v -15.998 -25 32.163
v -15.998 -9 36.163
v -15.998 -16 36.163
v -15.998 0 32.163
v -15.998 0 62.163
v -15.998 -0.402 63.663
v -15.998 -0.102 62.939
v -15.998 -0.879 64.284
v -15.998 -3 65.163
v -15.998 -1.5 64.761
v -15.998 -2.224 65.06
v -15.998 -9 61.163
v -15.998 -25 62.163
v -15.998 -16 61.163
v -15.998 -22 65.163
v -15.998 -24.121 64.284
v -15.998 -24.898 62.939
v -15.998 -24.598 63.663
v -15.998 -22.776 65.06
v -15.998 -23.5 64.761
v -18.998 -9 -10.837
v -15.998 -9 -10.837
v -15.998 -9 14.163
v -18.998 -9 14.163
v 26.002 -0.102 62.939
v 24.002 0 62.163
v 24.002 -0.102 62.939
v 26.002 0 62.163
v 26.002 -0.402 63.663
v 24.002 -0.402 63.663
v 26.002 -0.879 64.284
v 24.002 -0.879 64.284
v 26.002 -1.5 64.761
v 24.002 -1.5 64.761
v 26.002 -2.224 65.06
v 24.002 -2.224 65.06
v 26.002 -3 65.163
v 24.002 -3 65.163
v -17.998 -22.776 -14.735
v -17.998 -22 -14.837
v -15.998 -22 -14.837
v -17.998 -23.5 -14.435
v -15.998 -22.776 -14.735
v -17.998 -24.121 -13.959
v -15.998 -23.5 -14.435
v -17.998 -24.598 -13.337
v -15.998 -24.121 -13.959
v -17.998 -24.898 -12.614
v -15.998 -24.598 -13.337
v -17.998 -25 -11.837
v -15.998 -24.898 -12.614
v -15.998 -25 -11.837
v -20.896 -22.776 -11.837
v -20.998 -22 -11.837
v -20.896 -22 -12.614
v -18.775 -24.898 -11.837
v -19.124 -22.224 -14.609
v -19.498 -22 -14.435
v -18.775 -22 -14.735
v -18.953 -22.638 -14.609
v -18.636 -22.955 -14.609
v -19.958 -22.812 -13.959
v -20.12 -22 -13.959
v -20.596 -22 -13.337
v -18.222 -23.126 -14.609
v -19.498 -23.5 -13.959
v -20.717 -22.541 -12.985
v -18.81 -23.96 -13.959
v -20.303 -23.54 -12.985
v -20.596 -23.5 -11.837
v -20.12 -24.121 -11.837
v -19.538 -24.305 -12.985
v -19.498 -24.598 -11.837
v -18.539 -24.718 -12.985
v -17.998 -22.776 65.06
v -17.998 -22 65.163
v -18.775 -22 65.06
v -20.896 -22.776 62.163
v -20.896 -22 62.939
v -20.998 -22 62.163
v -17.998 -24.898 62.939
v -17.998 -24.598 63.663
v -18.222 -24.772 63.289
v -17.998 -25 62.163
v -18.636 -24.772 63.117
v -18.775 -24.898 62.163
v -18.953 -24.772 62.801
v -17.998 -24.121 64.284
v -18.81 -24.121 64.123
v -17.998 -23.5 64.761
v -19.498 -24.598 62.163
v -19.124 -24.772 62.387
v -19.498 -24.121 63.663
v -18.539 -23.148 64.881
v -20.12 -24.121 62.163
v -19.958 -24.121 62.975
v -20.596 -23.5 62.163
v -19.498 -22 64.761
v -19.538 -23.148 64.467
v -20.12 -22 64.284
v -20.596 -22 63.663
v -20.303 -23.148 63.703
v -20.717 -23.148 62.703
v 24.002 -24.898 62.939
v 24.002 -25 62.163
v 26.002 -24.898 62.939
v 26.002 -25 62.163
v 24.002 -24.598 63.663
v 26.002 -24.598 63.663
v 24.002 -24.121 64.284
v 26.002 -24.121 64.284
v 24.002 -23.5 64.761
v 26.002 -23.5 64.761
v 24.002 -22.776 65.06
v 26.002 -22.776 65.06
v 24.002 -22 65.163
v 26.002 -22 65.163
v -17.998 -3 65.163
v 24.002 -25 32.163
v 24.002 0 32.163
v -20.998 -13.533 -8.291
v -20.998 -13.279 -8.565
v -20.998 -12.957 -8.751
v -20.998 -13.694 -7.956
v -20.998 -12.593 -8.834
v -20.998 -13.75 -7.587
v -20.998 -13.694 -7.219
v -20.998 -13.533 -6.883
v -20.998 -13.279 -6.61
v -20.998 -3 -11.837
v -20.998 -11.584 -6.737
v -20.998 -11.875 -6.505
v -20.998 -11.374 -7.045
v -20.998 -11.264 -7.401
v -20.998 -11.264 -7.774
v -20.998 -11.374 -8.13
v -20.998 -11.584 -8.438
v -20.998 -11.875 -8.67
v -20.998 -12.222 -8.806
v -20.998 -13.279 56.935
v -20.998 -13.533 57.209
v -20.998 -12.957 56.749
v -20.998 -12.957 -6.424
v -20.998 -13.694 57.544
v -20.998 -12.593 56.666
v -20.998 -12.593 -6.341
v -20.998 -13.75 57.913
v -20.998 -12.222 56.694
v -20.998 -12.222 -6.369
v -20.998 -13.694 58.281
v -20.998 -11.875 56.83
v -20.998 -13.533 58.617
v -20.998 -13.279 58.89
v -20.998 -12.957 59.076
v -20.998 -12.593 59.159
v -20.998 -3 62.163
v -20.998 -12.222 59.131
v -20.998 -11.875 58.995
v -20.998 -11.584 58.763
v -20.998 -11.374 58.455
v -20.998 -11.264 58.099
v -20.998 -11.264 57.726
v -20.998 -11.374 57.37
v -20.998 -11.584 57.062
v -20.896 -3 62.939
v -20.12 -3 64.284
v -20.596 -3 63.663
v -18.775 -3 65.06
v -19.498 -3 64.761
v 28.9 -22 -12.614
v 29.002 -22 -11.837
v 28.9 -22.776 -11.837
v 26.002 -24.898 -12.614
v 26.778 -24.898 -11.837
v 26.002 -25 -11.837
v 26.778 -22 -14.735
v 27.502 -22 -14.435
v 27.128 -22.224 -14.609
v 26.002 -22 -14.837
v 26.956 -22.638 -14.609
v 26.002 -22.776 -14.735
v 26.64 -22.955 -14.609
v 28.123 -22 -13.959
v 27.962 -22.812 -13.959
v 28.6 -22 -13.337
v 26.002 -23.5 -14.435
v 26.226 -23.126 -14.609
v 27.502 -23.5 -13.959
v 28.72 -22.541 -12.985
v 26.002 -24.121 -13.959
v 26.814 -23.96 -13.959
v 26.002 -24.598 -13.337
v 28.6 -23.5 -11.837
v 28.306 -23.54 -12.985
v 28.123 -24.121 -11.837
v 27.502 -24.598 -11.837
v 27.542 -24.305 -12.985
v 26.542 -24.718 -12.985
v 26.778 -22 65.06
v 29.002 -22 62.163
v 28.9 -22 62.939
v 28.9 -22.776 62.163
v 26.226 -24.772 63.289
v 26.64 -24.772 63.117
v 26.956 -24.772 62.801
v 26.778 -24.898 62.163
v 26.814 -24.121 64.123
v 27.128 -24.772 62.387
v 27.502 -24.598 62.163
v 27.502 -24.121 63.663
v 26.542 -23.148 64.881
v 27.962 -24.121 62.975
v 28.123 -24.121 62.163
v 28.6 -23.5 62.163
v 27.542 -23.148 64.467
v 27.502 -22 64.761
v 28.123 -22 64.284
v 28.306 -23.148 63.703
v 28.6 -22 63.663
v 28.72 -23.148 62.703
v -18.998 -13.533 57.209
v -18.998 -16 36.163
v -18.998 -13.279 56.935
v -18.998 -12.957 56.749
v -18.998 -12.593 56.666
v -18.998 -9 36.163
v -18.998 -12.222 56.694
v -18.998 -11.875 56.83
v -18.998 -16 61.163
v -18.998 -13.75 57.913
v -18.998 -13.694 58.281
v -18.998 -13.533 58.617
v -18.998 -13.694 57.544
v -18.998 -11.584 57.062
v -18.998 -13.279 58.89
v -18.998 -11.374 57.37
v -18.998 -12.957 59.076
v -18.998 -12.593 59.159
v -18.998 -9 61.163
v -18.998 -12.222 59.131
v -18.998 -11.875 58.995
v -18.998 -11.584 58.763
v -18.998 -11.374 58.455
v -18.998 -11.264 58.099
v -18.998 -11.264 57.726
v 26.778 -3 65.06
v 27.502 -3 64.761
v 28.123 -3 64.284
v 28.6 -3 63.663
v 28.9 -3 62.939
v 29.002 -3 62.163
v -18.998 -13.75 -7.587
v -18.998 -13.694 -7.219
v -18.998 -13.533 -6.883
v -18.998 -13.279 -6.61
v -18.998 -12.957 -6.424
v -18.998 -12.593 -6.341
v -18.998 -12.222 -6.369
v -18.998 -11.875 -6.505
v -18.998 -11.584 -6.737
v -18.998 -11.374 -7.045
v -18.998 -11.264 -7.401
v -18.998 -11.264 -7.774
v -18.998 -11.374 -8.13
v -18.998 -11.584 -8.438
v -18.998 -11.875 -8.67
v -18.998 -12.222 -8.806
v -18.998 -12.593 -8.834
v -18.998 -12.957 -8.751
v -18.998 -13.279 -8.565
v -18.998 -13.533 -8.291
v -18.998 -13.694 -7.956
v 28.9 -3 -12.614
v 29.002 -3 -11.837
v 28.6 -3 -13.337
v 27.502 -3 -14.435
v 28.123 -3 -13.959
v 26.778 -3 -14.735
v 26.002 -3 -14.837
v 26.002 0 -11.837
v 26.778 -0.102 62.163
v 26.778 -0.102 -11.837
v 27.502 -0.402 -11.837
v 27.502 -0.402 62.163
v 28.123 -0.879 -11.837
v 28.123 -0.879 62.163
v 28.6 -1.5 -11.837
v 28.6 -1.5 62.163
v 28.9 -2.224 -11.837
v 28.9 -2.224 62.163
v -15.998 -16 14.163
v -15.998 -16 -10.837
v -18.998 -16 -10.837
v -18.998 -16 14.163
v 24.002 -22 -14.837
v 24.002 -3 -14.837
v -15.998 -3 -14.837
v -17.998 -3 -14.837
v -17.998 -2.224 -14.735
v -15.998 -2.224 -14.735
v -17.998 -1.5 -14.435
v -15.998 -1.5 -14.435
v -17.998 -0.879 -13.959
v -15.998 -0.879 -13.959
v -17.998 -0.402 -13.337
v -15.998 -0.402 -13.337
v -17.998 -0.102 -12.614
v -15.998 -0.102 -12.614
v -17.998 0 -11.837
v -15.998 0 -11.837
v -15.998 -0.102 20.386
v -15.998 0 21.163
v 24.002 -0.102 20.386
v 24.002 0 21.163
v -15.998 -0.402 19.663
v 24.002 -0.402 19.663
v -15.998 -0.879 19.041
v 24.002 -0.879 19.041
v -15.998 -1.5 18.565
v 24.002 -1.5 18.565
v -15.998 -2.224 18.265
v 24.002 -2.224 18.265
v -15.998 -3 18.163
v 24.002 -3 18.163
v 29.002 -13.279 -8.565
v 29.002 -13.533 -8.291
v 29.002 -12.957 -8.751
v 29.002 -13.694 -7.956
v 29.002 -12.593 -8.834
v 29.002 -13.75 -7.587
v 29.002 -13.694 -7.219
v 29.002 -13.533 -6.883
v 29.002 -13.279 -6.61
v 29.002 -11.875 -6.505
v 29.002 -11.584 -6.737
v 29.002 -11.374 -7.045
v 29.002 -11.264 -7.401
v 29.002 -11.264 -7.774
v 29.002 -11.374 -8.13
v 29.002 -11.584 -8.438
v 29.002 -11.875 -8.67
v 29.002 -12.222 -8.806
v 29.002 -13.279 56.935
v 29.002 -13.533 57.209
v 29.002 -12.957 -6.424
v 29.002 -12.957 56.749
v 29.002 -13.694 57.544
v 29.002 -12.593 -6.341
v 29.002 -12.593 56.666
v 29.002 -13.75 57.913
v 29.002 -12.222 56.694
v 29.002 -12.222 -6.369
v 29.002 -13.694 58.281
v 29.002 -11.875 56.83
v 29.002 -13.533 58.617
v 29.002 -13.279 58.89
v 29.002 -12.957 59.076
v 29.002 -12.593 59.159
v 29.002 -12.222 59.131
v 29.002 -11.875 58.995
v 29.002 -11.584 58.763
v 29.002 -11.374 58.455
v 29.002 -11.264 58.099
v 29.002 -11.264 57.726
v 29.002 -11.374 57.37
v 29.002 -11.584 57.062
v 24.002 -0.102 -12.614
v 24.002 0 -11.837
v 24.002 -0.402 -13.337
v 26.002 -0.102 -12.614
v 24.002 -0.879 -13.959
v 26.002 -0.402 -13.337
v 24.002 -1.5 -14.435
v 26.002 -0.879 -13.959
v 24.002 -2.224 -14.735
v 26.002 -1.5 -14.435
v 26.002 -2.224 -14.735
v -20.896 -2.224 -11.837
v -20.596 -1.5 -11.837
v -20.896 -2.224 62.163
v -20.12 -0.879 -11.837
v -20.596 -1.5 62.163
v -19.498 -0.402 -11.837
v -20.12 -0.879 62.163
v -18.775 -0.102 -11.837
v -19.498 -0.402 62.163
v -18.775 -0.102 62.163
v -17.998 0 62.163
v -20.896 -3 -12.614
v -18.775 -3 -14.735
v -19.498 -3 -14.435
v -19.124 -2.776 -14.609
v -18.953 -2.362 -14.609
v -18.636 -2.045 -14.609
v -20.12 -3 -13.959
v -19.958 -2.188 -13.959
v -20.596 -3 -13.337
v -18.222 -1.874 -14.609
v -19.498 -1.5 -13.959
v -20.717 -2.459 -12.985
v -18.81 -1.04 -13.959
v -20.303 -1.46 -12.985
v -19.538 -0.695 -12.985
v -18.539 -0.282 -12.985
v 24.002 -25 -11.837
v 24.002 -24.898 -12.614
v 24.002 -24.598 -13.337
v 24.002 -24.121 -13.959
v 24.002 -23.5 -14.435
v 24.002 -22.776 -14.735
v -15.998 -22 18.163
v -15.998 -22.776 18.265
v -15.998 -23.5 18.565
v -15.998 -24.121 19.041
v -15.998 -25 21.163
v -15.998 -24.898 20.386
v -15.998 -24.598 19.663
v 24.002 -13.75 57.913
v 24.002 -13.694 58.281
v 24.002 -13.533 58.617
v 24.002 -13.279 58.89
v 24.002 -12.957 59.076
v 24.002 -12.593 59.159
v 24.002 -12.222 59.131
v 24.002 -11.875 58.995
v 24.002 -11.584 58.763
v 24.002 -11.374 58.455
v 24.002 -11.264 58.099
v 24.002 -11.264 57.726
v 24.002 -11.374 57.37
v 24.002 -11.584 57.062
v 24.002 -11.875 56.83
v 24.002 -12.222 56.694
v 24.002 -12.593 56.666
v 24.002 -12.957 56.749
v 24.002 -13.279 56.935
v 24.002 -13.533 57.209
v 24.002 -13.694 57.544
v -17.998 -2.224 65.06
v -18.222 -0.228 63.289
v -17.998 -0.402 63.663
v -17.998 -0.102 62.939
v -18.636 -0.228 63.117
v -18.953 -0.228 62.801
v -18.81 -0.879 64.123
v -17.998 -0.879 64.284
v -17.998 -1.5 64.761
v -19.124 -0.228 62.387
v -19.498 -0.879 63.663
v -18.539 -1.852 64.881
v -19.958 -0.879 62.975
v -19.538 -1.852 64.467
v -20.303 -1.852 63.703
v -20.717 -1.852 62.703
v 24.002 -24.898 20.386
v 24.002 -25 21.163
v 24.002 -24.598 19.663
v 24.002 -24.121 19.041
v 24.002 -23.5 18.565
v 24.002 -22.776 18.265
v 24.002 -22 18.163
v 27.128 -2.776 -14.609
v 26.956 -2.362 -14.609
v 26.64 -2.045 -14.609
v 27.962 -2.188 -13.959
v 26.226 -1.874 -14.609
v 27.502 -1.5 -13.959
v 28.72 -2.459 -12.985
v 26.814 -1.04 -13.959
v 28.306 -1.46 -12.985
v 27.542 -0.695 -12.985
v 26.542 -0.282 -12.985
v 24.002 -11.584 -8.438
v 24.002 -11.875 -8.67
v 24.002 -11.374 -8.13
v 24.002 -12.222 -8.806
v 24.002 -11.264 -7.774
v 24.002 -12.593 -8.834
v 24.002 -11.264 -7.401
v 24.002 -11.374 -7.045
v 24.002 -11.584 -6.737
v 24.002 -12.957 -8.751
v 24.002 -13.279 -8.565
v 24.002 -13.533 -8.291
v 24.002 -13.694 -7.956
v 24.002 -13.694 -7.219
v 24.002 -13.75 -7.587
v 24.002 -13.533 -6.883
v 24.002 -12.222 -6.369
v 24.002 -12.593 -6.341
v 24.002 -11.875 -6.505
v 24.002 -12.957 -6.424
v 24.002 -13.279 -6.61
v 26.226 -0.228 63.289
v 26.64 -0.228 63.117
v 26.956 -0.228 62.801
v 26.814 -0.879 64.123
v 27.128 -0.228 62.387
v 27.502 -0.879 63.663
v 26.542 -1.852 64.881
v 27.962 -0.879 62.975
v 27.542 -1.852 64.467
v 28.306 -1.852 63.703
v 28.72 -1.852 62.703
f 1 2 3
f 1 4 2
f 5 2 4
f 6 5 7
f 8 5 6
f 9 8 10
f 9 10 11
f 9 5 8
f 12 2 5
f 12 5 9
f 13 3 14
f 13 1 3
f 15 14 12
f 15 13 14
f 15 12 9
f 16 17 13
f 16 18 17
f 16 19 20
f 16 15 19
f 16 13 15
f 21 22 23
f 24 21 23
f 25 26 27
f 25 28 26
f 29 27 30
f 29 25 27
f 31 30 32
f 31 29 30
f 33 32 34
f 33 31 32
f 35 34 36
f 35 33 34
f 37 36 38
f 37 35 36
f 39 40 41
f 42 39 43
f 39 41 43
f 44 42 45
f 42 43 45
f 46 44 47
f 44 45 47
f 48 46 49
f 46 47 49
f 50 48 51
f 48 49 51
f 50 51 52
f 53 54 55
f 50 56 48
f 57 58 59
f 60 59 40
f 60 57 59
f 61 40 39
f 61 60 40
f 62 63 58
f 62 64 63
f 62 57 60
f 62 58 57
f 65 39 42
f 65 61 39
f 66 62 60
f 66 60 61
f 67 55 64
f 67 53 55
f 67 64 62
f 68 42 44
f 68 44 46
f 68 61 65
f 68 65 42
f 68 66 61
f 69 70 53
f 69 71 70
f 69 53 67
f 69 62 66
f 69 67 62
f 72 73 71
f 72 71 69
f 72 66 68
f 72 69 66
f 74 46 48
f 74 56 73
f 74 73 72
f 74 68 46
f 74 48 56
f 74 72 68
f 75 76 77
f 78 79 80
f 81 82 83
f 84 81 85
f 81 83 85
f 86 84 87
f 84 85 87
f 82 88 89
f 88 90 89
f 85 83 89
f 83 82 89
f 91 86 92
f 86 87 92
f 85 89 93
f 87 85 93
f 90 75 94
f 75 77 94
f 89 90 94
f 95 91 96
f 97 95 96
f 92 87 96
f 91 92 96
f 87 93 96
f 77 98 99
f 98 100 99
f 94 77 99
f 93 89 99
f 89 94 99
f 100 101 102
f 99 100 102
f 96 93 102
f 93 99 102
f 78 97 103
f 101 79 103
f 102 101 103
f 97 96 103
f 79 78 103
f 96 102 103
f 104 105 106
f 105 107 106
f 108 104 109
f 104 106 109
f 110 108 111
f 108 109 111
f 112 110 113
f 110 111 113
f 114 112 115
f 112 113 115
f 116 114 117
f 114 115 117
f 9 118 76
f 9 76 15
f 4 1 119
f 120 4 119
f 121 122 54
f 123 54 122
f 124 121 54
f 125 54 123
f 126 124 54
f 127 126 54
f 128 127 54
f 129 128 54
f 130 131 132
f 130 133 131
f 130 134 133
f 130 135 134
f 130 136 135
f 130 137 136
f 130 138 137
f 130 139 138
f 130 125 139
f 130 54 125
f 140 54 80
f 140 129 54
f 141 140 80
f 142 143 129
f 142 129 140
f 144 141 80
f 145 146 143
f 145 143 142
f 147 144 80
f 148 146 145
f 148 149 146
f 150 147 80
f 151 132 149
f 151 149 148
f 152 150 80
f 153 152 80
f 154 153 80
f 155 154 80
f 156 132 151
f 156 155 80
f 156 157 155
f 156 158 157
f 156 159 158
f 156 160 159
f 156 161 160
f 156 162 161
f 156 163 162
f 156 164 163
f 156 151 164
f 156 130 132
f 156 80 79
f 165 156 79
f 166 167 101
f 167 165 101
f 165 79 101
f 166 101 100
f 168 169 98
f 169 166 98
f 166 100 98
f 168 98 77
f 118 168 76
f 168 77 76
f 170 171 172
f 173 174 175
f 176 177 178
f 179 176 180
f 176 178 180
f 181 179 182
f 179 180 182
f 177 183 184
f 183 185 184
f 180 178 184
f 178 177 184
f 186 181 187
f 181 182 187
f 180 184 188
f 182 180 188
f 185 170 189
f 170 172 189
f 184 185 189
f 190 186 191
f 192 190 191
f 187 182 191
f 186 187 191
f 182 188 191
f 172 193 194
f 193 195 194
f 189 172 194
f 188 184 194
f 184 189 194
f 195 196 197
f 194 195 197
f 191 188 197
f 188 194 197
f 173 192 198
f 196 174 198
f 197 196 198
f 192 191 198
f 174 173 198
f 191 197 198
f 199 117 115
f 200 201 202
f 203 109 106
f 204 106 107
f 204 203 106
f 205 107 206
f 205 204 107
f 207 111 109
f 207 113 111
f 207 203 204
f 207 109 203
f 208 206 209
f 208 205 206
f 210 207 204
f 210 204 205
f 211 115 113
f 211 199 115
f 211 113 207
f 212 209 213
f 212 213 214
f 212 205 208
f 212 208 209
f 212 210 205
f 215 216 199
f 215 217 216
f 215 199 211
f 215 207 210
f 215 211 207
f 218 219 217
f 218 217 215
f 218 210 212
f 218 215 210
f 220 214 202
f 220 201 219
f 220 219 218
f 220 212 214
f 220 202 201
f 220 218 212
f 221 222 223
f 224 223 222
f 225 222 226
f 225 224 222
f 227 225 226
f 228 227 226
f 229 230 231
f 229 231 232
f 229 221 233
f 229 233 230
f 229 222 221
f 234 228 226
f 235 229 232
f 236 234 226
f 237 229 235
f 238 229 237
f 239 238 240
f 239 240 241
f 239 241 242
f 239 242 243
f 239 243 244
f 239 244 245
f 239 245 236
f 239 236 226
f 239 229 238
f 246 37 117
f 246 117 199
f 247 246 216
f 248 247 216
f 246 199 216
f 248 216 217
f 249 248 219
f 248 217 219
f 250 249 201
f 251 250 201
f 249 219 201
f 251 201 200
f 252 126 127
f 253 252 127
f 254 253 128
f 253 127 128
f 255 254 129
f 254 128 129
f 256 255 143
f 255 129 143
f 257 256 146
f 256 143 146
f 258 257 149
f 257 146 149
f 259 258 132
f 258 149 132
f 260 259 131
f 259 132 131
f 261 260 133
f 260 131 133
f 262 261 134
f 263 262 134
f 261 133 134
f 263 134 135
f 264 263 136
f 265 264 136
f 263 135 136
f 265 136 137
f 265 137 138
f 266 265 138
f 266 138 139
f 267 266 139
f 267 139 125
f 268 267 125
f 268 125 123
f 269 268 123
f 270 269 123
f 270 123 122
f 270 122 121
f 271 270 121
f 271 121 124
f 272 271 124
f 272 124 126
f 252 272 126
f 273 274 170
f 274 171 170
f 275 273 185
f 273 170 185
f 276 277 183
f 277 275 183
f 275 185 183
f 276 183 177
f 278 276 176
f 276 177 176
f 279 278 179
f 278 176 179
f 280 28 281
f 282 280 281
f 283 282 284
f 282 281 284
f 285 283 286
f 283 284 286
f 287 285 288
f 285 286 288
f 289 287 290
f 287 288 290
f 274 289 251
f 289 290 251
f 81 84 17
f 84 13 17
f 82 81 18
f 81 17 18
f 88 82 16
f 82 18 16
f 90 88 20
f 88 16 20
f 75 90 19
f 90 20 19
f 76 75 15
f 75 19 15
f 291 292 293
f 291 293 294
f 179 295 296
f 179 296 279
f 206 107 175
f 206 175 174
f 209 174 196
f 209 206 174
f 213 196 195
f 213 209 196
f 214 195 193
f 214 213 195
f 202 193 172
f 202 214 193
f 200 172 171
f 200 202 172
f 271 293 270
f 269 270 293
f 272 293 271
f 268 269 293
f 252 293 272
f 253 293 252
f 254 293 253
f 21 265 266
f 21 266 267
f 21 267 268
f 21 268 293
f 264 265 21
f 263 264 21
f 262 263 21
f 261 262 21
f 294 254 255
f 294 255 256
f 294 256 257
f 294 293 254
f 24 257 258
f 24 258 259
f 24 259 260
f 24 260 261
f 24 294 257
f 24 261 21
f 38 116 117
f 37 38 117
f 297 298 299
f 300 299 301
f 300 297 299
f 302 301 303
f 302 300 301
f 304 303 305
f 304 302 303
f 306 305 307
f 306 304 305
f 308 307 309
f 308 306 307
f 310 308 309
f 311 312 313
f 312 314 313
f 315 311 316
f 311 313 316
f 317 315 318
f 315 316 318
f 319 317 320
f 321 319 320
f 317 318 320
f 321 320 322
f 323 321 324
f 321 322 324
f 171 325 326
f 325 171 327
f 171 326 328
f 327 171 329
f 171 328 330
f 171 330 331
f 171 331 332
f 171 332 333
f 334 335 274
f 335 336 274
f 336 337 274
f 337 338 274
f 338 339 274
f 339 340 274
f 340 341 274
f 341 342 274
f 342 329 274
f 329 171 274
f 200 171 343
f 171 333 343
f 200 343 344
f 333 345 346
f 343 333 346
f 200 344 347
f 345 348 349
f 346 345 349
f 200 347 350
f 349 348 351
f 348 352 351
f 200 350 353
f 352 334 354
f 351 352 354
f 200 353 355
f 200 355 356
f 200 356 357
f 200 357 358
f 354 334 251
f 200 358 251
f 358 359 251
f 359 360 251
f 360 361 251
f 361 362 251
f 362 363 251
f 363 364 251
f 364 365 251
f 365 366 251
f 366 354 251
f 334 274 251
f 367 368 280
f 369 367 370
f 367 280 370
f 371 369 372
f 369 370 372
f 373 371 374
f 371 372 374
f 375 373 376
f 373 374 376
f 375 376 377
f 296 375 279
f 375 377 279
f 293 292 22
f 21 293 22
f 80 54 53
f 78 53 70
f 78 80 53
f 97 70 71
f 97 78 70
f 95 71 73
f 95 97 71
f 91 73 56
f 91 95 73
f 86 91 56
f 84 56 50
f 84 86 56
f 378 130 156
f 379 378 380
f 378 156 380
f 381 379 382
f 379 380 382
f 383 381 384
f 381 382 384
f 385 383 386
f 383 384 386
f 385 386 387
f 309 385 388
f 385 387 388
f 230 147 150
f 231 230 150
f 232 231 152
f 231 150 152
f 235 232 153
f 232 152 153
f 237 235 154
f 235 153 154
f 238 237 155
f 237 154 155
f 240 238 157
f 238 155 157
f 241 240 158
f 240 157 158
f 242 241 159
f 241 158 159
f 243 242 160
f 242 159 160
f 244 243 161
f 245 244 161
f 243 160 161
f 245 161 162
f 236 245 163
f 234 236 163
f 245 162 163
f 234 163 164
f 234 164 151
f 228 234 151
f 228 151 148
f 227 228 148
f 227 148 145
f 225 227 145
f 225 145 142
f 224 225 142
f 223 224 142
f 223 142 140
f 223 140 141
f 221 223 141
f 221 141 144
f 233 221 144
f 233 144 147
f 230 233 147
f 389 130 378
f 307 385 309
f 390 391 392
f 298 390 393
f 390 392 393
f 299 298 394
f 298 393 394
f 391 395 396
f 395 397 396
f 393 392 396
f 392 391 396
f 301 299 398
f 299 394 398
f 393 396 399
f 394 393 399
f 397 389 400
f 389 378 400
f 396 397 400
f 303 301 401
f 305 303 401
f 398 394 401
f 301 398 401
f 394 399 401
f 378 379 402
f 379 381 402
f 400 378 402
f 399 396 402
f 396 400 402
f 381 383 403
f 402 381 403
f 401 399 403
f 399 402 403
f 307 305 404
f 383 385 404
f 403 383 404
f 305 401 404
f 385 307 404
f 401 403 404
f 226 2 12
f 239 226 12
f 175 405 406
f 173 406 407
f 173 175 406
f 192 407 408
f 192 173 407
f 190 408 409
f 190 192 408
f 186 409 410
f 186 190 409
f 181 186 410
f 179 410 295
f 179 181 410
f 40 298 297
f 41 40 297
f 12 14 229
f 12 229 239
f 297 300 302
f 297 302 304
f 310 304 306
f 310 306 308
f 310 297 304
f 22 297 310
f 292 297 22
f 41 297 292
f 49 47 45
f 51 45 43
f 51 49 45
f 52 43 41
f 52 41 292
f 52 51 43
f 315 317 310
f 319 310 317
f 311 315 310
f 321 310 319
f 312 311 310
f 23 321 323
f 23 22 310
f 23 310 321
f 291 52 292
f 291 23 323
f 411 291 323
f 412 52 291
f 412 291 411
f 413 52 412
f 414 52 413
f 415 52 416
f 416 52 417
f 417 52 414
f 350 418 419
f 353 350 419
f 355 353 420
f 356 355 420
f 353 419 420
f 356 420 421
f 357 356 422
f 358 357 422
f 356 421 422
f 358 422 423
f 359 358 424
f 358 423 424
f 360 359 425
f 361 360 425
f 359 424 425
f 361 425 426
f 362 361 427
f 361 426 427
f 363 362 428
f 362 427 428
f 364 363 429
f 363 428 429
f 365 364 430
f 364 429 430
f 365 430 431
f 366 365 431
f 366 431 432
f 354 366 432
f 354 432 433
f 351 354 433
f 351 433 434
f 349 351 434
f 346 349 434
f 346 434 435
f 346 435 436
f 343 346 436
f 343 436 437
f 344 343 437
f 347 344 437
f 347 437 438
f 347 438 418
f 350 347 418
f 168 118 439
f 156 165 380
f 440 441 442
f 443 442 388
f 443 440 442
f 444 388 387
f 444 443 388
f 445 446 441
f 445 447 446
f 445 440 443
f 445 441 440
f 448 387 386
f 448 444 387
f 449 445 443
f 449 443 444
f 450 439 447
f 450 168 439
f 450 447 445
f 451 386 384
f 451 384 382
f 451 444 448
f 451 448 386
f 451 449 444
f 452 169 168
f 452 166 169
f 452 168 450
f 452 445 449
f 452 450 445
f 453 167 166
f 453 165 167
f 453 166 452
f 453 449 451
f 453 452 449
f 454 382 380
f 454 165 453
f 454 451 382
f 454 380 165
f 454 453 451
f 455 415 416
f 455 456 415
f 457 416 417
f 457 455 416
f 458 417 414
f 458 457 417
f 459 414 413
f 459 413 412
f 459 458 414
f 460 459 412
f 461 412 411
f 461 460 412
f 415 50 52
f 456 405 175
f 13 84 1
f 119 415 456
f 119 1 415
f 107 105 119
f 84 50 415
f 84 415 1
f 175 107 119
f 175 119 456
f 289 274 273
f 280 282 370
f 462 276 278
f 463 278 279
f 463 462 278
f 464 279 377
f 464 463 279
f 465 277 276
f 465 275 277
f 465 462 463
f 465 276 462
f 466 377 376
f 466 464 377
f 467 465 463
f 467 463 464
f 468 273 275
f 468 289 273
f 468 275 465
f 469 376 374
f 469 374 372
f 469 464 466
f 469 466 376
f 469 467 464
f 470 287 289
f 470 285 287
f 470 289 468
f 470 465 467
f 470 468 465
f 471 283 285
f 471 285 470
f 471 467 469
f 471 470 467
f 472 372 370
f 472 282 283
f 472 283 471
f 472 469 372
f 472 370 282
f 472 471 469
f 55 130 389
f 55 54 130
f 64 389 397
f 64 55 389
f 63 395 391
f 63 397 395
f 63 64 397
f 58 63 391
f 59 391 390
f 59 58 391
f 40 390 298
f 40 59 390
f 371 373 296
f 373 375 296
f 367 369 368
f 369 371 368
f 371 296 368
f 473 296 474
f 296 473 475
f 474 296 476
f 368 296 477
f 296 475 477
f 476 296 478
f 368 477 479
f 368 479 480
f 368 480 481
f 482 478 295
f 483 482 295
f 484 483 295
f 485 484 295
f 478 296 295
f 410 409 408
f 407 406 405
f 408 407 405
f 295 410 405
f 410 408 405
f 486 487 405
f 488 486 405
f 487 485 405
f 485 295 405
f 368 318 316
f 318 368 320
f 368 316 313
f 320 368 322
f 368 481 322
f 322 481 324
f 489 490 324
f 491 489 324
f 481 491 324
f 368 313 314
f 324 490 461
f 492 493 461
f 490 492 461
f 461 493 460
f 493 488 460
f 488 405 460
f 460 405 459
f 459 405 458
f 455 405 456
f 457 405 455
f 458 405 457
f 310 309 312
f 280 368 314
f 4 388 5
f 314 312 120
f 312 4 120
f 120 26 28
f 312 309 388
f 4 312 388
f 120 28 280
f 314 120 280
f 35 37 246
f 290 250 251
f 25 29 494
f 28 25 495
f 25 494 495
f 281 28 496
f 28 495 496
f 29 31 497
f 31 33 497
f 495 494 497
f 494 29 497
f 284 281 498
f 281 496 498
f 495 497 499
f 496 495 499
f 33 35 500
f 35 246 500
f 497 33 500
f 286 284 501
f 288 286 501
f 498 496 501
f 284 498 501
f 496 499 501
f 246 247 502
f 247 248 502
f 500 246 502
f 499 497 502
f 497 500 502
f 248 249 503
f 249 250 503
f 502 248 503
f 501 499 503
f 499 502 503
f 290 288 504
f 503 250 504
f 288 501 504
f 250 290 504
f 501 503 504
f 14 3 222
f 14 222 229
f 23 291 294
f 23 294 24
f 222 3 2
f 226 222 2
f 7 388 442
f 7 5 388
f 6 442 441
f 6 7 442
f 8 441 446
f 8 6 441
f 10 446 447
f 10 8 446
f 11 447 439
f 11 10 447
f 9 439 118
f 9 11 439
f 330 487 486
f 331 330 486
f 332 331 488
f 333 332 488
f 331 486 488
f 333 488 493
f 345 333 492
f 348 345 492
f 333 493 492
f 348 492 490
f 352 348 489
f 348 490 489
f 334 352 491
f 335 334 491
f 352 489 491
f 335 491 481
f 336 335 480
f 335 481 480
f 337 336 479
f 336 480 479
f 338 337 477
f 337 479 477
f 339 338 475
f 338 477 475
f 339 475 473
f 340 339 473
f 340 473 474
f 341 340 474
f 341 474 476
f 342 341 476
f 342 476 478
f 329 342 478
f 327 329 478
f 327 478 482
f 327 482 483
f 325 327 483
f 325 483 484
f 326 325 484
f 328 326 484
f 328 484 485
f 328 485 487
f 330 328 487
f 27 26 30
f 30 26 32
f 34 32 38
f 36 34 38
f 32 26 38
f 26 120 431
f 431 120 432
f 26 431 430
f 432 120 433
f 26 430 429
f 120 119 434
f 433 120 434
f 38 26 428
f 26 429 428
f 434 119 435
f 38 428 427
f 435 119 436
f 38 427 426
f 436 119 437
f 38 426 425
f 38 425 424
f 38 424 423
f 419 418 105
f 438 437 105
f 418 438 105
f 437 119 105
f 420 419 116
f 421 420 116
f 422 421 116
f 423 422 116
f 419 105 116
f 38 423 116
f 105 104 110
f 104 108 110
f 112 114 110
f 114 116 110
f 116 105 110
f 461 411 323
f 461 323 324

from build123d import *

# Parameters (mm, degrees)
F0_W     = 50
F0_H     = 80
F1_DEPTH = 25
F2_W     = 40
F2_H     = 33
F3_DEPTH = 25.001
F4_W     = 7
F4_H     = 25
F5_DEPTH = 3
F6_R     = 1.25
F7_DEPTH = 50.001
F8_R     = 3


with BuildPart() as f1:
    # F0 (on Front) → F1 (new body)
    with BuildSketch(Plane.XZ):
        with Locations((4.001731, 25.162706)):
            Rectangle(F0_W, F0_H)
    extrude(amount=F1_DEPTH)

    # F2 (on face) → F3 (cut, through all)
    with BuildSketch(Plane.XZ.offset(25)):
        with Locations((4.001731, 1.662706)):
            Rectangle(F2_W, F2_H)
        with Locations((4.001731, 48.662706)):
            Rectangle(F2_W, F2_H)
    extrude(amount=-F3_DEPTH, mode=Mode.SUBTRACT)

    # F4 (on face) → F5 (cut)
    with BuildSketch(Plane.YZ.offset(-15.998269)):
        with Locations((-12.5, 1.662706)):
            Rectangle(F4_W, F4_H)
        with Locations((-12.5, 48.662706)):
            Rectangle(F4_W, F4_H)
    extrude(amount=-F5_DEPTH, mode=Mode.SUBTRACT)

    # F6 (on face) → F7 (cut, through all)
    with BuildSketch(Plane(origin=(-20.998269, 0, 0), x_dir=(0, -1, 0), z_dir=(-1, 0, 0))):
        with Locations((12.5, -7.587294)):
            Circle(F6_R)
        with Locations((12.5, 57.912706)):
            Circle(F6_R)
    extrude(amount=-F7_DEPTH, mode=Mode.SUBTRACT)

    # F8
    f8_edges = [f1.edges().sort_by_distance(p)[0] for p in [
        (29.001731, -12.5, 65.162706),
        (-20.998269, -12.5, 65.162706),
        (-18.498269, 0, 65.162706),
        (26.501731, 0, 65.162706),
        (-18.498269, -25, 65.162706),
        (26.501731, -25, 65.162706),
        (29.001731, -25, 25.162706),
        (29.001731, 0, 25.162706),
        (-20.998269, -25, 25.162706),
        (-20.998269, 0, 25.162706),
        (-20.998269, -12.5, -14.837294),
        (29.001731, -12.5, -14.837294),
        (26.501731, -25, -14.837294),
        (-18.498269, -25, -14.837294),
        (26.501731, 0, -14.837294),
        (-18.498269, 0, -14.837294),
        (4.001731, -25, 18.162706),
        (4.001731, 0, 18.162706),
    ]]
    fillet(f8_edges, radius=F8_R)


solid = f1.part
